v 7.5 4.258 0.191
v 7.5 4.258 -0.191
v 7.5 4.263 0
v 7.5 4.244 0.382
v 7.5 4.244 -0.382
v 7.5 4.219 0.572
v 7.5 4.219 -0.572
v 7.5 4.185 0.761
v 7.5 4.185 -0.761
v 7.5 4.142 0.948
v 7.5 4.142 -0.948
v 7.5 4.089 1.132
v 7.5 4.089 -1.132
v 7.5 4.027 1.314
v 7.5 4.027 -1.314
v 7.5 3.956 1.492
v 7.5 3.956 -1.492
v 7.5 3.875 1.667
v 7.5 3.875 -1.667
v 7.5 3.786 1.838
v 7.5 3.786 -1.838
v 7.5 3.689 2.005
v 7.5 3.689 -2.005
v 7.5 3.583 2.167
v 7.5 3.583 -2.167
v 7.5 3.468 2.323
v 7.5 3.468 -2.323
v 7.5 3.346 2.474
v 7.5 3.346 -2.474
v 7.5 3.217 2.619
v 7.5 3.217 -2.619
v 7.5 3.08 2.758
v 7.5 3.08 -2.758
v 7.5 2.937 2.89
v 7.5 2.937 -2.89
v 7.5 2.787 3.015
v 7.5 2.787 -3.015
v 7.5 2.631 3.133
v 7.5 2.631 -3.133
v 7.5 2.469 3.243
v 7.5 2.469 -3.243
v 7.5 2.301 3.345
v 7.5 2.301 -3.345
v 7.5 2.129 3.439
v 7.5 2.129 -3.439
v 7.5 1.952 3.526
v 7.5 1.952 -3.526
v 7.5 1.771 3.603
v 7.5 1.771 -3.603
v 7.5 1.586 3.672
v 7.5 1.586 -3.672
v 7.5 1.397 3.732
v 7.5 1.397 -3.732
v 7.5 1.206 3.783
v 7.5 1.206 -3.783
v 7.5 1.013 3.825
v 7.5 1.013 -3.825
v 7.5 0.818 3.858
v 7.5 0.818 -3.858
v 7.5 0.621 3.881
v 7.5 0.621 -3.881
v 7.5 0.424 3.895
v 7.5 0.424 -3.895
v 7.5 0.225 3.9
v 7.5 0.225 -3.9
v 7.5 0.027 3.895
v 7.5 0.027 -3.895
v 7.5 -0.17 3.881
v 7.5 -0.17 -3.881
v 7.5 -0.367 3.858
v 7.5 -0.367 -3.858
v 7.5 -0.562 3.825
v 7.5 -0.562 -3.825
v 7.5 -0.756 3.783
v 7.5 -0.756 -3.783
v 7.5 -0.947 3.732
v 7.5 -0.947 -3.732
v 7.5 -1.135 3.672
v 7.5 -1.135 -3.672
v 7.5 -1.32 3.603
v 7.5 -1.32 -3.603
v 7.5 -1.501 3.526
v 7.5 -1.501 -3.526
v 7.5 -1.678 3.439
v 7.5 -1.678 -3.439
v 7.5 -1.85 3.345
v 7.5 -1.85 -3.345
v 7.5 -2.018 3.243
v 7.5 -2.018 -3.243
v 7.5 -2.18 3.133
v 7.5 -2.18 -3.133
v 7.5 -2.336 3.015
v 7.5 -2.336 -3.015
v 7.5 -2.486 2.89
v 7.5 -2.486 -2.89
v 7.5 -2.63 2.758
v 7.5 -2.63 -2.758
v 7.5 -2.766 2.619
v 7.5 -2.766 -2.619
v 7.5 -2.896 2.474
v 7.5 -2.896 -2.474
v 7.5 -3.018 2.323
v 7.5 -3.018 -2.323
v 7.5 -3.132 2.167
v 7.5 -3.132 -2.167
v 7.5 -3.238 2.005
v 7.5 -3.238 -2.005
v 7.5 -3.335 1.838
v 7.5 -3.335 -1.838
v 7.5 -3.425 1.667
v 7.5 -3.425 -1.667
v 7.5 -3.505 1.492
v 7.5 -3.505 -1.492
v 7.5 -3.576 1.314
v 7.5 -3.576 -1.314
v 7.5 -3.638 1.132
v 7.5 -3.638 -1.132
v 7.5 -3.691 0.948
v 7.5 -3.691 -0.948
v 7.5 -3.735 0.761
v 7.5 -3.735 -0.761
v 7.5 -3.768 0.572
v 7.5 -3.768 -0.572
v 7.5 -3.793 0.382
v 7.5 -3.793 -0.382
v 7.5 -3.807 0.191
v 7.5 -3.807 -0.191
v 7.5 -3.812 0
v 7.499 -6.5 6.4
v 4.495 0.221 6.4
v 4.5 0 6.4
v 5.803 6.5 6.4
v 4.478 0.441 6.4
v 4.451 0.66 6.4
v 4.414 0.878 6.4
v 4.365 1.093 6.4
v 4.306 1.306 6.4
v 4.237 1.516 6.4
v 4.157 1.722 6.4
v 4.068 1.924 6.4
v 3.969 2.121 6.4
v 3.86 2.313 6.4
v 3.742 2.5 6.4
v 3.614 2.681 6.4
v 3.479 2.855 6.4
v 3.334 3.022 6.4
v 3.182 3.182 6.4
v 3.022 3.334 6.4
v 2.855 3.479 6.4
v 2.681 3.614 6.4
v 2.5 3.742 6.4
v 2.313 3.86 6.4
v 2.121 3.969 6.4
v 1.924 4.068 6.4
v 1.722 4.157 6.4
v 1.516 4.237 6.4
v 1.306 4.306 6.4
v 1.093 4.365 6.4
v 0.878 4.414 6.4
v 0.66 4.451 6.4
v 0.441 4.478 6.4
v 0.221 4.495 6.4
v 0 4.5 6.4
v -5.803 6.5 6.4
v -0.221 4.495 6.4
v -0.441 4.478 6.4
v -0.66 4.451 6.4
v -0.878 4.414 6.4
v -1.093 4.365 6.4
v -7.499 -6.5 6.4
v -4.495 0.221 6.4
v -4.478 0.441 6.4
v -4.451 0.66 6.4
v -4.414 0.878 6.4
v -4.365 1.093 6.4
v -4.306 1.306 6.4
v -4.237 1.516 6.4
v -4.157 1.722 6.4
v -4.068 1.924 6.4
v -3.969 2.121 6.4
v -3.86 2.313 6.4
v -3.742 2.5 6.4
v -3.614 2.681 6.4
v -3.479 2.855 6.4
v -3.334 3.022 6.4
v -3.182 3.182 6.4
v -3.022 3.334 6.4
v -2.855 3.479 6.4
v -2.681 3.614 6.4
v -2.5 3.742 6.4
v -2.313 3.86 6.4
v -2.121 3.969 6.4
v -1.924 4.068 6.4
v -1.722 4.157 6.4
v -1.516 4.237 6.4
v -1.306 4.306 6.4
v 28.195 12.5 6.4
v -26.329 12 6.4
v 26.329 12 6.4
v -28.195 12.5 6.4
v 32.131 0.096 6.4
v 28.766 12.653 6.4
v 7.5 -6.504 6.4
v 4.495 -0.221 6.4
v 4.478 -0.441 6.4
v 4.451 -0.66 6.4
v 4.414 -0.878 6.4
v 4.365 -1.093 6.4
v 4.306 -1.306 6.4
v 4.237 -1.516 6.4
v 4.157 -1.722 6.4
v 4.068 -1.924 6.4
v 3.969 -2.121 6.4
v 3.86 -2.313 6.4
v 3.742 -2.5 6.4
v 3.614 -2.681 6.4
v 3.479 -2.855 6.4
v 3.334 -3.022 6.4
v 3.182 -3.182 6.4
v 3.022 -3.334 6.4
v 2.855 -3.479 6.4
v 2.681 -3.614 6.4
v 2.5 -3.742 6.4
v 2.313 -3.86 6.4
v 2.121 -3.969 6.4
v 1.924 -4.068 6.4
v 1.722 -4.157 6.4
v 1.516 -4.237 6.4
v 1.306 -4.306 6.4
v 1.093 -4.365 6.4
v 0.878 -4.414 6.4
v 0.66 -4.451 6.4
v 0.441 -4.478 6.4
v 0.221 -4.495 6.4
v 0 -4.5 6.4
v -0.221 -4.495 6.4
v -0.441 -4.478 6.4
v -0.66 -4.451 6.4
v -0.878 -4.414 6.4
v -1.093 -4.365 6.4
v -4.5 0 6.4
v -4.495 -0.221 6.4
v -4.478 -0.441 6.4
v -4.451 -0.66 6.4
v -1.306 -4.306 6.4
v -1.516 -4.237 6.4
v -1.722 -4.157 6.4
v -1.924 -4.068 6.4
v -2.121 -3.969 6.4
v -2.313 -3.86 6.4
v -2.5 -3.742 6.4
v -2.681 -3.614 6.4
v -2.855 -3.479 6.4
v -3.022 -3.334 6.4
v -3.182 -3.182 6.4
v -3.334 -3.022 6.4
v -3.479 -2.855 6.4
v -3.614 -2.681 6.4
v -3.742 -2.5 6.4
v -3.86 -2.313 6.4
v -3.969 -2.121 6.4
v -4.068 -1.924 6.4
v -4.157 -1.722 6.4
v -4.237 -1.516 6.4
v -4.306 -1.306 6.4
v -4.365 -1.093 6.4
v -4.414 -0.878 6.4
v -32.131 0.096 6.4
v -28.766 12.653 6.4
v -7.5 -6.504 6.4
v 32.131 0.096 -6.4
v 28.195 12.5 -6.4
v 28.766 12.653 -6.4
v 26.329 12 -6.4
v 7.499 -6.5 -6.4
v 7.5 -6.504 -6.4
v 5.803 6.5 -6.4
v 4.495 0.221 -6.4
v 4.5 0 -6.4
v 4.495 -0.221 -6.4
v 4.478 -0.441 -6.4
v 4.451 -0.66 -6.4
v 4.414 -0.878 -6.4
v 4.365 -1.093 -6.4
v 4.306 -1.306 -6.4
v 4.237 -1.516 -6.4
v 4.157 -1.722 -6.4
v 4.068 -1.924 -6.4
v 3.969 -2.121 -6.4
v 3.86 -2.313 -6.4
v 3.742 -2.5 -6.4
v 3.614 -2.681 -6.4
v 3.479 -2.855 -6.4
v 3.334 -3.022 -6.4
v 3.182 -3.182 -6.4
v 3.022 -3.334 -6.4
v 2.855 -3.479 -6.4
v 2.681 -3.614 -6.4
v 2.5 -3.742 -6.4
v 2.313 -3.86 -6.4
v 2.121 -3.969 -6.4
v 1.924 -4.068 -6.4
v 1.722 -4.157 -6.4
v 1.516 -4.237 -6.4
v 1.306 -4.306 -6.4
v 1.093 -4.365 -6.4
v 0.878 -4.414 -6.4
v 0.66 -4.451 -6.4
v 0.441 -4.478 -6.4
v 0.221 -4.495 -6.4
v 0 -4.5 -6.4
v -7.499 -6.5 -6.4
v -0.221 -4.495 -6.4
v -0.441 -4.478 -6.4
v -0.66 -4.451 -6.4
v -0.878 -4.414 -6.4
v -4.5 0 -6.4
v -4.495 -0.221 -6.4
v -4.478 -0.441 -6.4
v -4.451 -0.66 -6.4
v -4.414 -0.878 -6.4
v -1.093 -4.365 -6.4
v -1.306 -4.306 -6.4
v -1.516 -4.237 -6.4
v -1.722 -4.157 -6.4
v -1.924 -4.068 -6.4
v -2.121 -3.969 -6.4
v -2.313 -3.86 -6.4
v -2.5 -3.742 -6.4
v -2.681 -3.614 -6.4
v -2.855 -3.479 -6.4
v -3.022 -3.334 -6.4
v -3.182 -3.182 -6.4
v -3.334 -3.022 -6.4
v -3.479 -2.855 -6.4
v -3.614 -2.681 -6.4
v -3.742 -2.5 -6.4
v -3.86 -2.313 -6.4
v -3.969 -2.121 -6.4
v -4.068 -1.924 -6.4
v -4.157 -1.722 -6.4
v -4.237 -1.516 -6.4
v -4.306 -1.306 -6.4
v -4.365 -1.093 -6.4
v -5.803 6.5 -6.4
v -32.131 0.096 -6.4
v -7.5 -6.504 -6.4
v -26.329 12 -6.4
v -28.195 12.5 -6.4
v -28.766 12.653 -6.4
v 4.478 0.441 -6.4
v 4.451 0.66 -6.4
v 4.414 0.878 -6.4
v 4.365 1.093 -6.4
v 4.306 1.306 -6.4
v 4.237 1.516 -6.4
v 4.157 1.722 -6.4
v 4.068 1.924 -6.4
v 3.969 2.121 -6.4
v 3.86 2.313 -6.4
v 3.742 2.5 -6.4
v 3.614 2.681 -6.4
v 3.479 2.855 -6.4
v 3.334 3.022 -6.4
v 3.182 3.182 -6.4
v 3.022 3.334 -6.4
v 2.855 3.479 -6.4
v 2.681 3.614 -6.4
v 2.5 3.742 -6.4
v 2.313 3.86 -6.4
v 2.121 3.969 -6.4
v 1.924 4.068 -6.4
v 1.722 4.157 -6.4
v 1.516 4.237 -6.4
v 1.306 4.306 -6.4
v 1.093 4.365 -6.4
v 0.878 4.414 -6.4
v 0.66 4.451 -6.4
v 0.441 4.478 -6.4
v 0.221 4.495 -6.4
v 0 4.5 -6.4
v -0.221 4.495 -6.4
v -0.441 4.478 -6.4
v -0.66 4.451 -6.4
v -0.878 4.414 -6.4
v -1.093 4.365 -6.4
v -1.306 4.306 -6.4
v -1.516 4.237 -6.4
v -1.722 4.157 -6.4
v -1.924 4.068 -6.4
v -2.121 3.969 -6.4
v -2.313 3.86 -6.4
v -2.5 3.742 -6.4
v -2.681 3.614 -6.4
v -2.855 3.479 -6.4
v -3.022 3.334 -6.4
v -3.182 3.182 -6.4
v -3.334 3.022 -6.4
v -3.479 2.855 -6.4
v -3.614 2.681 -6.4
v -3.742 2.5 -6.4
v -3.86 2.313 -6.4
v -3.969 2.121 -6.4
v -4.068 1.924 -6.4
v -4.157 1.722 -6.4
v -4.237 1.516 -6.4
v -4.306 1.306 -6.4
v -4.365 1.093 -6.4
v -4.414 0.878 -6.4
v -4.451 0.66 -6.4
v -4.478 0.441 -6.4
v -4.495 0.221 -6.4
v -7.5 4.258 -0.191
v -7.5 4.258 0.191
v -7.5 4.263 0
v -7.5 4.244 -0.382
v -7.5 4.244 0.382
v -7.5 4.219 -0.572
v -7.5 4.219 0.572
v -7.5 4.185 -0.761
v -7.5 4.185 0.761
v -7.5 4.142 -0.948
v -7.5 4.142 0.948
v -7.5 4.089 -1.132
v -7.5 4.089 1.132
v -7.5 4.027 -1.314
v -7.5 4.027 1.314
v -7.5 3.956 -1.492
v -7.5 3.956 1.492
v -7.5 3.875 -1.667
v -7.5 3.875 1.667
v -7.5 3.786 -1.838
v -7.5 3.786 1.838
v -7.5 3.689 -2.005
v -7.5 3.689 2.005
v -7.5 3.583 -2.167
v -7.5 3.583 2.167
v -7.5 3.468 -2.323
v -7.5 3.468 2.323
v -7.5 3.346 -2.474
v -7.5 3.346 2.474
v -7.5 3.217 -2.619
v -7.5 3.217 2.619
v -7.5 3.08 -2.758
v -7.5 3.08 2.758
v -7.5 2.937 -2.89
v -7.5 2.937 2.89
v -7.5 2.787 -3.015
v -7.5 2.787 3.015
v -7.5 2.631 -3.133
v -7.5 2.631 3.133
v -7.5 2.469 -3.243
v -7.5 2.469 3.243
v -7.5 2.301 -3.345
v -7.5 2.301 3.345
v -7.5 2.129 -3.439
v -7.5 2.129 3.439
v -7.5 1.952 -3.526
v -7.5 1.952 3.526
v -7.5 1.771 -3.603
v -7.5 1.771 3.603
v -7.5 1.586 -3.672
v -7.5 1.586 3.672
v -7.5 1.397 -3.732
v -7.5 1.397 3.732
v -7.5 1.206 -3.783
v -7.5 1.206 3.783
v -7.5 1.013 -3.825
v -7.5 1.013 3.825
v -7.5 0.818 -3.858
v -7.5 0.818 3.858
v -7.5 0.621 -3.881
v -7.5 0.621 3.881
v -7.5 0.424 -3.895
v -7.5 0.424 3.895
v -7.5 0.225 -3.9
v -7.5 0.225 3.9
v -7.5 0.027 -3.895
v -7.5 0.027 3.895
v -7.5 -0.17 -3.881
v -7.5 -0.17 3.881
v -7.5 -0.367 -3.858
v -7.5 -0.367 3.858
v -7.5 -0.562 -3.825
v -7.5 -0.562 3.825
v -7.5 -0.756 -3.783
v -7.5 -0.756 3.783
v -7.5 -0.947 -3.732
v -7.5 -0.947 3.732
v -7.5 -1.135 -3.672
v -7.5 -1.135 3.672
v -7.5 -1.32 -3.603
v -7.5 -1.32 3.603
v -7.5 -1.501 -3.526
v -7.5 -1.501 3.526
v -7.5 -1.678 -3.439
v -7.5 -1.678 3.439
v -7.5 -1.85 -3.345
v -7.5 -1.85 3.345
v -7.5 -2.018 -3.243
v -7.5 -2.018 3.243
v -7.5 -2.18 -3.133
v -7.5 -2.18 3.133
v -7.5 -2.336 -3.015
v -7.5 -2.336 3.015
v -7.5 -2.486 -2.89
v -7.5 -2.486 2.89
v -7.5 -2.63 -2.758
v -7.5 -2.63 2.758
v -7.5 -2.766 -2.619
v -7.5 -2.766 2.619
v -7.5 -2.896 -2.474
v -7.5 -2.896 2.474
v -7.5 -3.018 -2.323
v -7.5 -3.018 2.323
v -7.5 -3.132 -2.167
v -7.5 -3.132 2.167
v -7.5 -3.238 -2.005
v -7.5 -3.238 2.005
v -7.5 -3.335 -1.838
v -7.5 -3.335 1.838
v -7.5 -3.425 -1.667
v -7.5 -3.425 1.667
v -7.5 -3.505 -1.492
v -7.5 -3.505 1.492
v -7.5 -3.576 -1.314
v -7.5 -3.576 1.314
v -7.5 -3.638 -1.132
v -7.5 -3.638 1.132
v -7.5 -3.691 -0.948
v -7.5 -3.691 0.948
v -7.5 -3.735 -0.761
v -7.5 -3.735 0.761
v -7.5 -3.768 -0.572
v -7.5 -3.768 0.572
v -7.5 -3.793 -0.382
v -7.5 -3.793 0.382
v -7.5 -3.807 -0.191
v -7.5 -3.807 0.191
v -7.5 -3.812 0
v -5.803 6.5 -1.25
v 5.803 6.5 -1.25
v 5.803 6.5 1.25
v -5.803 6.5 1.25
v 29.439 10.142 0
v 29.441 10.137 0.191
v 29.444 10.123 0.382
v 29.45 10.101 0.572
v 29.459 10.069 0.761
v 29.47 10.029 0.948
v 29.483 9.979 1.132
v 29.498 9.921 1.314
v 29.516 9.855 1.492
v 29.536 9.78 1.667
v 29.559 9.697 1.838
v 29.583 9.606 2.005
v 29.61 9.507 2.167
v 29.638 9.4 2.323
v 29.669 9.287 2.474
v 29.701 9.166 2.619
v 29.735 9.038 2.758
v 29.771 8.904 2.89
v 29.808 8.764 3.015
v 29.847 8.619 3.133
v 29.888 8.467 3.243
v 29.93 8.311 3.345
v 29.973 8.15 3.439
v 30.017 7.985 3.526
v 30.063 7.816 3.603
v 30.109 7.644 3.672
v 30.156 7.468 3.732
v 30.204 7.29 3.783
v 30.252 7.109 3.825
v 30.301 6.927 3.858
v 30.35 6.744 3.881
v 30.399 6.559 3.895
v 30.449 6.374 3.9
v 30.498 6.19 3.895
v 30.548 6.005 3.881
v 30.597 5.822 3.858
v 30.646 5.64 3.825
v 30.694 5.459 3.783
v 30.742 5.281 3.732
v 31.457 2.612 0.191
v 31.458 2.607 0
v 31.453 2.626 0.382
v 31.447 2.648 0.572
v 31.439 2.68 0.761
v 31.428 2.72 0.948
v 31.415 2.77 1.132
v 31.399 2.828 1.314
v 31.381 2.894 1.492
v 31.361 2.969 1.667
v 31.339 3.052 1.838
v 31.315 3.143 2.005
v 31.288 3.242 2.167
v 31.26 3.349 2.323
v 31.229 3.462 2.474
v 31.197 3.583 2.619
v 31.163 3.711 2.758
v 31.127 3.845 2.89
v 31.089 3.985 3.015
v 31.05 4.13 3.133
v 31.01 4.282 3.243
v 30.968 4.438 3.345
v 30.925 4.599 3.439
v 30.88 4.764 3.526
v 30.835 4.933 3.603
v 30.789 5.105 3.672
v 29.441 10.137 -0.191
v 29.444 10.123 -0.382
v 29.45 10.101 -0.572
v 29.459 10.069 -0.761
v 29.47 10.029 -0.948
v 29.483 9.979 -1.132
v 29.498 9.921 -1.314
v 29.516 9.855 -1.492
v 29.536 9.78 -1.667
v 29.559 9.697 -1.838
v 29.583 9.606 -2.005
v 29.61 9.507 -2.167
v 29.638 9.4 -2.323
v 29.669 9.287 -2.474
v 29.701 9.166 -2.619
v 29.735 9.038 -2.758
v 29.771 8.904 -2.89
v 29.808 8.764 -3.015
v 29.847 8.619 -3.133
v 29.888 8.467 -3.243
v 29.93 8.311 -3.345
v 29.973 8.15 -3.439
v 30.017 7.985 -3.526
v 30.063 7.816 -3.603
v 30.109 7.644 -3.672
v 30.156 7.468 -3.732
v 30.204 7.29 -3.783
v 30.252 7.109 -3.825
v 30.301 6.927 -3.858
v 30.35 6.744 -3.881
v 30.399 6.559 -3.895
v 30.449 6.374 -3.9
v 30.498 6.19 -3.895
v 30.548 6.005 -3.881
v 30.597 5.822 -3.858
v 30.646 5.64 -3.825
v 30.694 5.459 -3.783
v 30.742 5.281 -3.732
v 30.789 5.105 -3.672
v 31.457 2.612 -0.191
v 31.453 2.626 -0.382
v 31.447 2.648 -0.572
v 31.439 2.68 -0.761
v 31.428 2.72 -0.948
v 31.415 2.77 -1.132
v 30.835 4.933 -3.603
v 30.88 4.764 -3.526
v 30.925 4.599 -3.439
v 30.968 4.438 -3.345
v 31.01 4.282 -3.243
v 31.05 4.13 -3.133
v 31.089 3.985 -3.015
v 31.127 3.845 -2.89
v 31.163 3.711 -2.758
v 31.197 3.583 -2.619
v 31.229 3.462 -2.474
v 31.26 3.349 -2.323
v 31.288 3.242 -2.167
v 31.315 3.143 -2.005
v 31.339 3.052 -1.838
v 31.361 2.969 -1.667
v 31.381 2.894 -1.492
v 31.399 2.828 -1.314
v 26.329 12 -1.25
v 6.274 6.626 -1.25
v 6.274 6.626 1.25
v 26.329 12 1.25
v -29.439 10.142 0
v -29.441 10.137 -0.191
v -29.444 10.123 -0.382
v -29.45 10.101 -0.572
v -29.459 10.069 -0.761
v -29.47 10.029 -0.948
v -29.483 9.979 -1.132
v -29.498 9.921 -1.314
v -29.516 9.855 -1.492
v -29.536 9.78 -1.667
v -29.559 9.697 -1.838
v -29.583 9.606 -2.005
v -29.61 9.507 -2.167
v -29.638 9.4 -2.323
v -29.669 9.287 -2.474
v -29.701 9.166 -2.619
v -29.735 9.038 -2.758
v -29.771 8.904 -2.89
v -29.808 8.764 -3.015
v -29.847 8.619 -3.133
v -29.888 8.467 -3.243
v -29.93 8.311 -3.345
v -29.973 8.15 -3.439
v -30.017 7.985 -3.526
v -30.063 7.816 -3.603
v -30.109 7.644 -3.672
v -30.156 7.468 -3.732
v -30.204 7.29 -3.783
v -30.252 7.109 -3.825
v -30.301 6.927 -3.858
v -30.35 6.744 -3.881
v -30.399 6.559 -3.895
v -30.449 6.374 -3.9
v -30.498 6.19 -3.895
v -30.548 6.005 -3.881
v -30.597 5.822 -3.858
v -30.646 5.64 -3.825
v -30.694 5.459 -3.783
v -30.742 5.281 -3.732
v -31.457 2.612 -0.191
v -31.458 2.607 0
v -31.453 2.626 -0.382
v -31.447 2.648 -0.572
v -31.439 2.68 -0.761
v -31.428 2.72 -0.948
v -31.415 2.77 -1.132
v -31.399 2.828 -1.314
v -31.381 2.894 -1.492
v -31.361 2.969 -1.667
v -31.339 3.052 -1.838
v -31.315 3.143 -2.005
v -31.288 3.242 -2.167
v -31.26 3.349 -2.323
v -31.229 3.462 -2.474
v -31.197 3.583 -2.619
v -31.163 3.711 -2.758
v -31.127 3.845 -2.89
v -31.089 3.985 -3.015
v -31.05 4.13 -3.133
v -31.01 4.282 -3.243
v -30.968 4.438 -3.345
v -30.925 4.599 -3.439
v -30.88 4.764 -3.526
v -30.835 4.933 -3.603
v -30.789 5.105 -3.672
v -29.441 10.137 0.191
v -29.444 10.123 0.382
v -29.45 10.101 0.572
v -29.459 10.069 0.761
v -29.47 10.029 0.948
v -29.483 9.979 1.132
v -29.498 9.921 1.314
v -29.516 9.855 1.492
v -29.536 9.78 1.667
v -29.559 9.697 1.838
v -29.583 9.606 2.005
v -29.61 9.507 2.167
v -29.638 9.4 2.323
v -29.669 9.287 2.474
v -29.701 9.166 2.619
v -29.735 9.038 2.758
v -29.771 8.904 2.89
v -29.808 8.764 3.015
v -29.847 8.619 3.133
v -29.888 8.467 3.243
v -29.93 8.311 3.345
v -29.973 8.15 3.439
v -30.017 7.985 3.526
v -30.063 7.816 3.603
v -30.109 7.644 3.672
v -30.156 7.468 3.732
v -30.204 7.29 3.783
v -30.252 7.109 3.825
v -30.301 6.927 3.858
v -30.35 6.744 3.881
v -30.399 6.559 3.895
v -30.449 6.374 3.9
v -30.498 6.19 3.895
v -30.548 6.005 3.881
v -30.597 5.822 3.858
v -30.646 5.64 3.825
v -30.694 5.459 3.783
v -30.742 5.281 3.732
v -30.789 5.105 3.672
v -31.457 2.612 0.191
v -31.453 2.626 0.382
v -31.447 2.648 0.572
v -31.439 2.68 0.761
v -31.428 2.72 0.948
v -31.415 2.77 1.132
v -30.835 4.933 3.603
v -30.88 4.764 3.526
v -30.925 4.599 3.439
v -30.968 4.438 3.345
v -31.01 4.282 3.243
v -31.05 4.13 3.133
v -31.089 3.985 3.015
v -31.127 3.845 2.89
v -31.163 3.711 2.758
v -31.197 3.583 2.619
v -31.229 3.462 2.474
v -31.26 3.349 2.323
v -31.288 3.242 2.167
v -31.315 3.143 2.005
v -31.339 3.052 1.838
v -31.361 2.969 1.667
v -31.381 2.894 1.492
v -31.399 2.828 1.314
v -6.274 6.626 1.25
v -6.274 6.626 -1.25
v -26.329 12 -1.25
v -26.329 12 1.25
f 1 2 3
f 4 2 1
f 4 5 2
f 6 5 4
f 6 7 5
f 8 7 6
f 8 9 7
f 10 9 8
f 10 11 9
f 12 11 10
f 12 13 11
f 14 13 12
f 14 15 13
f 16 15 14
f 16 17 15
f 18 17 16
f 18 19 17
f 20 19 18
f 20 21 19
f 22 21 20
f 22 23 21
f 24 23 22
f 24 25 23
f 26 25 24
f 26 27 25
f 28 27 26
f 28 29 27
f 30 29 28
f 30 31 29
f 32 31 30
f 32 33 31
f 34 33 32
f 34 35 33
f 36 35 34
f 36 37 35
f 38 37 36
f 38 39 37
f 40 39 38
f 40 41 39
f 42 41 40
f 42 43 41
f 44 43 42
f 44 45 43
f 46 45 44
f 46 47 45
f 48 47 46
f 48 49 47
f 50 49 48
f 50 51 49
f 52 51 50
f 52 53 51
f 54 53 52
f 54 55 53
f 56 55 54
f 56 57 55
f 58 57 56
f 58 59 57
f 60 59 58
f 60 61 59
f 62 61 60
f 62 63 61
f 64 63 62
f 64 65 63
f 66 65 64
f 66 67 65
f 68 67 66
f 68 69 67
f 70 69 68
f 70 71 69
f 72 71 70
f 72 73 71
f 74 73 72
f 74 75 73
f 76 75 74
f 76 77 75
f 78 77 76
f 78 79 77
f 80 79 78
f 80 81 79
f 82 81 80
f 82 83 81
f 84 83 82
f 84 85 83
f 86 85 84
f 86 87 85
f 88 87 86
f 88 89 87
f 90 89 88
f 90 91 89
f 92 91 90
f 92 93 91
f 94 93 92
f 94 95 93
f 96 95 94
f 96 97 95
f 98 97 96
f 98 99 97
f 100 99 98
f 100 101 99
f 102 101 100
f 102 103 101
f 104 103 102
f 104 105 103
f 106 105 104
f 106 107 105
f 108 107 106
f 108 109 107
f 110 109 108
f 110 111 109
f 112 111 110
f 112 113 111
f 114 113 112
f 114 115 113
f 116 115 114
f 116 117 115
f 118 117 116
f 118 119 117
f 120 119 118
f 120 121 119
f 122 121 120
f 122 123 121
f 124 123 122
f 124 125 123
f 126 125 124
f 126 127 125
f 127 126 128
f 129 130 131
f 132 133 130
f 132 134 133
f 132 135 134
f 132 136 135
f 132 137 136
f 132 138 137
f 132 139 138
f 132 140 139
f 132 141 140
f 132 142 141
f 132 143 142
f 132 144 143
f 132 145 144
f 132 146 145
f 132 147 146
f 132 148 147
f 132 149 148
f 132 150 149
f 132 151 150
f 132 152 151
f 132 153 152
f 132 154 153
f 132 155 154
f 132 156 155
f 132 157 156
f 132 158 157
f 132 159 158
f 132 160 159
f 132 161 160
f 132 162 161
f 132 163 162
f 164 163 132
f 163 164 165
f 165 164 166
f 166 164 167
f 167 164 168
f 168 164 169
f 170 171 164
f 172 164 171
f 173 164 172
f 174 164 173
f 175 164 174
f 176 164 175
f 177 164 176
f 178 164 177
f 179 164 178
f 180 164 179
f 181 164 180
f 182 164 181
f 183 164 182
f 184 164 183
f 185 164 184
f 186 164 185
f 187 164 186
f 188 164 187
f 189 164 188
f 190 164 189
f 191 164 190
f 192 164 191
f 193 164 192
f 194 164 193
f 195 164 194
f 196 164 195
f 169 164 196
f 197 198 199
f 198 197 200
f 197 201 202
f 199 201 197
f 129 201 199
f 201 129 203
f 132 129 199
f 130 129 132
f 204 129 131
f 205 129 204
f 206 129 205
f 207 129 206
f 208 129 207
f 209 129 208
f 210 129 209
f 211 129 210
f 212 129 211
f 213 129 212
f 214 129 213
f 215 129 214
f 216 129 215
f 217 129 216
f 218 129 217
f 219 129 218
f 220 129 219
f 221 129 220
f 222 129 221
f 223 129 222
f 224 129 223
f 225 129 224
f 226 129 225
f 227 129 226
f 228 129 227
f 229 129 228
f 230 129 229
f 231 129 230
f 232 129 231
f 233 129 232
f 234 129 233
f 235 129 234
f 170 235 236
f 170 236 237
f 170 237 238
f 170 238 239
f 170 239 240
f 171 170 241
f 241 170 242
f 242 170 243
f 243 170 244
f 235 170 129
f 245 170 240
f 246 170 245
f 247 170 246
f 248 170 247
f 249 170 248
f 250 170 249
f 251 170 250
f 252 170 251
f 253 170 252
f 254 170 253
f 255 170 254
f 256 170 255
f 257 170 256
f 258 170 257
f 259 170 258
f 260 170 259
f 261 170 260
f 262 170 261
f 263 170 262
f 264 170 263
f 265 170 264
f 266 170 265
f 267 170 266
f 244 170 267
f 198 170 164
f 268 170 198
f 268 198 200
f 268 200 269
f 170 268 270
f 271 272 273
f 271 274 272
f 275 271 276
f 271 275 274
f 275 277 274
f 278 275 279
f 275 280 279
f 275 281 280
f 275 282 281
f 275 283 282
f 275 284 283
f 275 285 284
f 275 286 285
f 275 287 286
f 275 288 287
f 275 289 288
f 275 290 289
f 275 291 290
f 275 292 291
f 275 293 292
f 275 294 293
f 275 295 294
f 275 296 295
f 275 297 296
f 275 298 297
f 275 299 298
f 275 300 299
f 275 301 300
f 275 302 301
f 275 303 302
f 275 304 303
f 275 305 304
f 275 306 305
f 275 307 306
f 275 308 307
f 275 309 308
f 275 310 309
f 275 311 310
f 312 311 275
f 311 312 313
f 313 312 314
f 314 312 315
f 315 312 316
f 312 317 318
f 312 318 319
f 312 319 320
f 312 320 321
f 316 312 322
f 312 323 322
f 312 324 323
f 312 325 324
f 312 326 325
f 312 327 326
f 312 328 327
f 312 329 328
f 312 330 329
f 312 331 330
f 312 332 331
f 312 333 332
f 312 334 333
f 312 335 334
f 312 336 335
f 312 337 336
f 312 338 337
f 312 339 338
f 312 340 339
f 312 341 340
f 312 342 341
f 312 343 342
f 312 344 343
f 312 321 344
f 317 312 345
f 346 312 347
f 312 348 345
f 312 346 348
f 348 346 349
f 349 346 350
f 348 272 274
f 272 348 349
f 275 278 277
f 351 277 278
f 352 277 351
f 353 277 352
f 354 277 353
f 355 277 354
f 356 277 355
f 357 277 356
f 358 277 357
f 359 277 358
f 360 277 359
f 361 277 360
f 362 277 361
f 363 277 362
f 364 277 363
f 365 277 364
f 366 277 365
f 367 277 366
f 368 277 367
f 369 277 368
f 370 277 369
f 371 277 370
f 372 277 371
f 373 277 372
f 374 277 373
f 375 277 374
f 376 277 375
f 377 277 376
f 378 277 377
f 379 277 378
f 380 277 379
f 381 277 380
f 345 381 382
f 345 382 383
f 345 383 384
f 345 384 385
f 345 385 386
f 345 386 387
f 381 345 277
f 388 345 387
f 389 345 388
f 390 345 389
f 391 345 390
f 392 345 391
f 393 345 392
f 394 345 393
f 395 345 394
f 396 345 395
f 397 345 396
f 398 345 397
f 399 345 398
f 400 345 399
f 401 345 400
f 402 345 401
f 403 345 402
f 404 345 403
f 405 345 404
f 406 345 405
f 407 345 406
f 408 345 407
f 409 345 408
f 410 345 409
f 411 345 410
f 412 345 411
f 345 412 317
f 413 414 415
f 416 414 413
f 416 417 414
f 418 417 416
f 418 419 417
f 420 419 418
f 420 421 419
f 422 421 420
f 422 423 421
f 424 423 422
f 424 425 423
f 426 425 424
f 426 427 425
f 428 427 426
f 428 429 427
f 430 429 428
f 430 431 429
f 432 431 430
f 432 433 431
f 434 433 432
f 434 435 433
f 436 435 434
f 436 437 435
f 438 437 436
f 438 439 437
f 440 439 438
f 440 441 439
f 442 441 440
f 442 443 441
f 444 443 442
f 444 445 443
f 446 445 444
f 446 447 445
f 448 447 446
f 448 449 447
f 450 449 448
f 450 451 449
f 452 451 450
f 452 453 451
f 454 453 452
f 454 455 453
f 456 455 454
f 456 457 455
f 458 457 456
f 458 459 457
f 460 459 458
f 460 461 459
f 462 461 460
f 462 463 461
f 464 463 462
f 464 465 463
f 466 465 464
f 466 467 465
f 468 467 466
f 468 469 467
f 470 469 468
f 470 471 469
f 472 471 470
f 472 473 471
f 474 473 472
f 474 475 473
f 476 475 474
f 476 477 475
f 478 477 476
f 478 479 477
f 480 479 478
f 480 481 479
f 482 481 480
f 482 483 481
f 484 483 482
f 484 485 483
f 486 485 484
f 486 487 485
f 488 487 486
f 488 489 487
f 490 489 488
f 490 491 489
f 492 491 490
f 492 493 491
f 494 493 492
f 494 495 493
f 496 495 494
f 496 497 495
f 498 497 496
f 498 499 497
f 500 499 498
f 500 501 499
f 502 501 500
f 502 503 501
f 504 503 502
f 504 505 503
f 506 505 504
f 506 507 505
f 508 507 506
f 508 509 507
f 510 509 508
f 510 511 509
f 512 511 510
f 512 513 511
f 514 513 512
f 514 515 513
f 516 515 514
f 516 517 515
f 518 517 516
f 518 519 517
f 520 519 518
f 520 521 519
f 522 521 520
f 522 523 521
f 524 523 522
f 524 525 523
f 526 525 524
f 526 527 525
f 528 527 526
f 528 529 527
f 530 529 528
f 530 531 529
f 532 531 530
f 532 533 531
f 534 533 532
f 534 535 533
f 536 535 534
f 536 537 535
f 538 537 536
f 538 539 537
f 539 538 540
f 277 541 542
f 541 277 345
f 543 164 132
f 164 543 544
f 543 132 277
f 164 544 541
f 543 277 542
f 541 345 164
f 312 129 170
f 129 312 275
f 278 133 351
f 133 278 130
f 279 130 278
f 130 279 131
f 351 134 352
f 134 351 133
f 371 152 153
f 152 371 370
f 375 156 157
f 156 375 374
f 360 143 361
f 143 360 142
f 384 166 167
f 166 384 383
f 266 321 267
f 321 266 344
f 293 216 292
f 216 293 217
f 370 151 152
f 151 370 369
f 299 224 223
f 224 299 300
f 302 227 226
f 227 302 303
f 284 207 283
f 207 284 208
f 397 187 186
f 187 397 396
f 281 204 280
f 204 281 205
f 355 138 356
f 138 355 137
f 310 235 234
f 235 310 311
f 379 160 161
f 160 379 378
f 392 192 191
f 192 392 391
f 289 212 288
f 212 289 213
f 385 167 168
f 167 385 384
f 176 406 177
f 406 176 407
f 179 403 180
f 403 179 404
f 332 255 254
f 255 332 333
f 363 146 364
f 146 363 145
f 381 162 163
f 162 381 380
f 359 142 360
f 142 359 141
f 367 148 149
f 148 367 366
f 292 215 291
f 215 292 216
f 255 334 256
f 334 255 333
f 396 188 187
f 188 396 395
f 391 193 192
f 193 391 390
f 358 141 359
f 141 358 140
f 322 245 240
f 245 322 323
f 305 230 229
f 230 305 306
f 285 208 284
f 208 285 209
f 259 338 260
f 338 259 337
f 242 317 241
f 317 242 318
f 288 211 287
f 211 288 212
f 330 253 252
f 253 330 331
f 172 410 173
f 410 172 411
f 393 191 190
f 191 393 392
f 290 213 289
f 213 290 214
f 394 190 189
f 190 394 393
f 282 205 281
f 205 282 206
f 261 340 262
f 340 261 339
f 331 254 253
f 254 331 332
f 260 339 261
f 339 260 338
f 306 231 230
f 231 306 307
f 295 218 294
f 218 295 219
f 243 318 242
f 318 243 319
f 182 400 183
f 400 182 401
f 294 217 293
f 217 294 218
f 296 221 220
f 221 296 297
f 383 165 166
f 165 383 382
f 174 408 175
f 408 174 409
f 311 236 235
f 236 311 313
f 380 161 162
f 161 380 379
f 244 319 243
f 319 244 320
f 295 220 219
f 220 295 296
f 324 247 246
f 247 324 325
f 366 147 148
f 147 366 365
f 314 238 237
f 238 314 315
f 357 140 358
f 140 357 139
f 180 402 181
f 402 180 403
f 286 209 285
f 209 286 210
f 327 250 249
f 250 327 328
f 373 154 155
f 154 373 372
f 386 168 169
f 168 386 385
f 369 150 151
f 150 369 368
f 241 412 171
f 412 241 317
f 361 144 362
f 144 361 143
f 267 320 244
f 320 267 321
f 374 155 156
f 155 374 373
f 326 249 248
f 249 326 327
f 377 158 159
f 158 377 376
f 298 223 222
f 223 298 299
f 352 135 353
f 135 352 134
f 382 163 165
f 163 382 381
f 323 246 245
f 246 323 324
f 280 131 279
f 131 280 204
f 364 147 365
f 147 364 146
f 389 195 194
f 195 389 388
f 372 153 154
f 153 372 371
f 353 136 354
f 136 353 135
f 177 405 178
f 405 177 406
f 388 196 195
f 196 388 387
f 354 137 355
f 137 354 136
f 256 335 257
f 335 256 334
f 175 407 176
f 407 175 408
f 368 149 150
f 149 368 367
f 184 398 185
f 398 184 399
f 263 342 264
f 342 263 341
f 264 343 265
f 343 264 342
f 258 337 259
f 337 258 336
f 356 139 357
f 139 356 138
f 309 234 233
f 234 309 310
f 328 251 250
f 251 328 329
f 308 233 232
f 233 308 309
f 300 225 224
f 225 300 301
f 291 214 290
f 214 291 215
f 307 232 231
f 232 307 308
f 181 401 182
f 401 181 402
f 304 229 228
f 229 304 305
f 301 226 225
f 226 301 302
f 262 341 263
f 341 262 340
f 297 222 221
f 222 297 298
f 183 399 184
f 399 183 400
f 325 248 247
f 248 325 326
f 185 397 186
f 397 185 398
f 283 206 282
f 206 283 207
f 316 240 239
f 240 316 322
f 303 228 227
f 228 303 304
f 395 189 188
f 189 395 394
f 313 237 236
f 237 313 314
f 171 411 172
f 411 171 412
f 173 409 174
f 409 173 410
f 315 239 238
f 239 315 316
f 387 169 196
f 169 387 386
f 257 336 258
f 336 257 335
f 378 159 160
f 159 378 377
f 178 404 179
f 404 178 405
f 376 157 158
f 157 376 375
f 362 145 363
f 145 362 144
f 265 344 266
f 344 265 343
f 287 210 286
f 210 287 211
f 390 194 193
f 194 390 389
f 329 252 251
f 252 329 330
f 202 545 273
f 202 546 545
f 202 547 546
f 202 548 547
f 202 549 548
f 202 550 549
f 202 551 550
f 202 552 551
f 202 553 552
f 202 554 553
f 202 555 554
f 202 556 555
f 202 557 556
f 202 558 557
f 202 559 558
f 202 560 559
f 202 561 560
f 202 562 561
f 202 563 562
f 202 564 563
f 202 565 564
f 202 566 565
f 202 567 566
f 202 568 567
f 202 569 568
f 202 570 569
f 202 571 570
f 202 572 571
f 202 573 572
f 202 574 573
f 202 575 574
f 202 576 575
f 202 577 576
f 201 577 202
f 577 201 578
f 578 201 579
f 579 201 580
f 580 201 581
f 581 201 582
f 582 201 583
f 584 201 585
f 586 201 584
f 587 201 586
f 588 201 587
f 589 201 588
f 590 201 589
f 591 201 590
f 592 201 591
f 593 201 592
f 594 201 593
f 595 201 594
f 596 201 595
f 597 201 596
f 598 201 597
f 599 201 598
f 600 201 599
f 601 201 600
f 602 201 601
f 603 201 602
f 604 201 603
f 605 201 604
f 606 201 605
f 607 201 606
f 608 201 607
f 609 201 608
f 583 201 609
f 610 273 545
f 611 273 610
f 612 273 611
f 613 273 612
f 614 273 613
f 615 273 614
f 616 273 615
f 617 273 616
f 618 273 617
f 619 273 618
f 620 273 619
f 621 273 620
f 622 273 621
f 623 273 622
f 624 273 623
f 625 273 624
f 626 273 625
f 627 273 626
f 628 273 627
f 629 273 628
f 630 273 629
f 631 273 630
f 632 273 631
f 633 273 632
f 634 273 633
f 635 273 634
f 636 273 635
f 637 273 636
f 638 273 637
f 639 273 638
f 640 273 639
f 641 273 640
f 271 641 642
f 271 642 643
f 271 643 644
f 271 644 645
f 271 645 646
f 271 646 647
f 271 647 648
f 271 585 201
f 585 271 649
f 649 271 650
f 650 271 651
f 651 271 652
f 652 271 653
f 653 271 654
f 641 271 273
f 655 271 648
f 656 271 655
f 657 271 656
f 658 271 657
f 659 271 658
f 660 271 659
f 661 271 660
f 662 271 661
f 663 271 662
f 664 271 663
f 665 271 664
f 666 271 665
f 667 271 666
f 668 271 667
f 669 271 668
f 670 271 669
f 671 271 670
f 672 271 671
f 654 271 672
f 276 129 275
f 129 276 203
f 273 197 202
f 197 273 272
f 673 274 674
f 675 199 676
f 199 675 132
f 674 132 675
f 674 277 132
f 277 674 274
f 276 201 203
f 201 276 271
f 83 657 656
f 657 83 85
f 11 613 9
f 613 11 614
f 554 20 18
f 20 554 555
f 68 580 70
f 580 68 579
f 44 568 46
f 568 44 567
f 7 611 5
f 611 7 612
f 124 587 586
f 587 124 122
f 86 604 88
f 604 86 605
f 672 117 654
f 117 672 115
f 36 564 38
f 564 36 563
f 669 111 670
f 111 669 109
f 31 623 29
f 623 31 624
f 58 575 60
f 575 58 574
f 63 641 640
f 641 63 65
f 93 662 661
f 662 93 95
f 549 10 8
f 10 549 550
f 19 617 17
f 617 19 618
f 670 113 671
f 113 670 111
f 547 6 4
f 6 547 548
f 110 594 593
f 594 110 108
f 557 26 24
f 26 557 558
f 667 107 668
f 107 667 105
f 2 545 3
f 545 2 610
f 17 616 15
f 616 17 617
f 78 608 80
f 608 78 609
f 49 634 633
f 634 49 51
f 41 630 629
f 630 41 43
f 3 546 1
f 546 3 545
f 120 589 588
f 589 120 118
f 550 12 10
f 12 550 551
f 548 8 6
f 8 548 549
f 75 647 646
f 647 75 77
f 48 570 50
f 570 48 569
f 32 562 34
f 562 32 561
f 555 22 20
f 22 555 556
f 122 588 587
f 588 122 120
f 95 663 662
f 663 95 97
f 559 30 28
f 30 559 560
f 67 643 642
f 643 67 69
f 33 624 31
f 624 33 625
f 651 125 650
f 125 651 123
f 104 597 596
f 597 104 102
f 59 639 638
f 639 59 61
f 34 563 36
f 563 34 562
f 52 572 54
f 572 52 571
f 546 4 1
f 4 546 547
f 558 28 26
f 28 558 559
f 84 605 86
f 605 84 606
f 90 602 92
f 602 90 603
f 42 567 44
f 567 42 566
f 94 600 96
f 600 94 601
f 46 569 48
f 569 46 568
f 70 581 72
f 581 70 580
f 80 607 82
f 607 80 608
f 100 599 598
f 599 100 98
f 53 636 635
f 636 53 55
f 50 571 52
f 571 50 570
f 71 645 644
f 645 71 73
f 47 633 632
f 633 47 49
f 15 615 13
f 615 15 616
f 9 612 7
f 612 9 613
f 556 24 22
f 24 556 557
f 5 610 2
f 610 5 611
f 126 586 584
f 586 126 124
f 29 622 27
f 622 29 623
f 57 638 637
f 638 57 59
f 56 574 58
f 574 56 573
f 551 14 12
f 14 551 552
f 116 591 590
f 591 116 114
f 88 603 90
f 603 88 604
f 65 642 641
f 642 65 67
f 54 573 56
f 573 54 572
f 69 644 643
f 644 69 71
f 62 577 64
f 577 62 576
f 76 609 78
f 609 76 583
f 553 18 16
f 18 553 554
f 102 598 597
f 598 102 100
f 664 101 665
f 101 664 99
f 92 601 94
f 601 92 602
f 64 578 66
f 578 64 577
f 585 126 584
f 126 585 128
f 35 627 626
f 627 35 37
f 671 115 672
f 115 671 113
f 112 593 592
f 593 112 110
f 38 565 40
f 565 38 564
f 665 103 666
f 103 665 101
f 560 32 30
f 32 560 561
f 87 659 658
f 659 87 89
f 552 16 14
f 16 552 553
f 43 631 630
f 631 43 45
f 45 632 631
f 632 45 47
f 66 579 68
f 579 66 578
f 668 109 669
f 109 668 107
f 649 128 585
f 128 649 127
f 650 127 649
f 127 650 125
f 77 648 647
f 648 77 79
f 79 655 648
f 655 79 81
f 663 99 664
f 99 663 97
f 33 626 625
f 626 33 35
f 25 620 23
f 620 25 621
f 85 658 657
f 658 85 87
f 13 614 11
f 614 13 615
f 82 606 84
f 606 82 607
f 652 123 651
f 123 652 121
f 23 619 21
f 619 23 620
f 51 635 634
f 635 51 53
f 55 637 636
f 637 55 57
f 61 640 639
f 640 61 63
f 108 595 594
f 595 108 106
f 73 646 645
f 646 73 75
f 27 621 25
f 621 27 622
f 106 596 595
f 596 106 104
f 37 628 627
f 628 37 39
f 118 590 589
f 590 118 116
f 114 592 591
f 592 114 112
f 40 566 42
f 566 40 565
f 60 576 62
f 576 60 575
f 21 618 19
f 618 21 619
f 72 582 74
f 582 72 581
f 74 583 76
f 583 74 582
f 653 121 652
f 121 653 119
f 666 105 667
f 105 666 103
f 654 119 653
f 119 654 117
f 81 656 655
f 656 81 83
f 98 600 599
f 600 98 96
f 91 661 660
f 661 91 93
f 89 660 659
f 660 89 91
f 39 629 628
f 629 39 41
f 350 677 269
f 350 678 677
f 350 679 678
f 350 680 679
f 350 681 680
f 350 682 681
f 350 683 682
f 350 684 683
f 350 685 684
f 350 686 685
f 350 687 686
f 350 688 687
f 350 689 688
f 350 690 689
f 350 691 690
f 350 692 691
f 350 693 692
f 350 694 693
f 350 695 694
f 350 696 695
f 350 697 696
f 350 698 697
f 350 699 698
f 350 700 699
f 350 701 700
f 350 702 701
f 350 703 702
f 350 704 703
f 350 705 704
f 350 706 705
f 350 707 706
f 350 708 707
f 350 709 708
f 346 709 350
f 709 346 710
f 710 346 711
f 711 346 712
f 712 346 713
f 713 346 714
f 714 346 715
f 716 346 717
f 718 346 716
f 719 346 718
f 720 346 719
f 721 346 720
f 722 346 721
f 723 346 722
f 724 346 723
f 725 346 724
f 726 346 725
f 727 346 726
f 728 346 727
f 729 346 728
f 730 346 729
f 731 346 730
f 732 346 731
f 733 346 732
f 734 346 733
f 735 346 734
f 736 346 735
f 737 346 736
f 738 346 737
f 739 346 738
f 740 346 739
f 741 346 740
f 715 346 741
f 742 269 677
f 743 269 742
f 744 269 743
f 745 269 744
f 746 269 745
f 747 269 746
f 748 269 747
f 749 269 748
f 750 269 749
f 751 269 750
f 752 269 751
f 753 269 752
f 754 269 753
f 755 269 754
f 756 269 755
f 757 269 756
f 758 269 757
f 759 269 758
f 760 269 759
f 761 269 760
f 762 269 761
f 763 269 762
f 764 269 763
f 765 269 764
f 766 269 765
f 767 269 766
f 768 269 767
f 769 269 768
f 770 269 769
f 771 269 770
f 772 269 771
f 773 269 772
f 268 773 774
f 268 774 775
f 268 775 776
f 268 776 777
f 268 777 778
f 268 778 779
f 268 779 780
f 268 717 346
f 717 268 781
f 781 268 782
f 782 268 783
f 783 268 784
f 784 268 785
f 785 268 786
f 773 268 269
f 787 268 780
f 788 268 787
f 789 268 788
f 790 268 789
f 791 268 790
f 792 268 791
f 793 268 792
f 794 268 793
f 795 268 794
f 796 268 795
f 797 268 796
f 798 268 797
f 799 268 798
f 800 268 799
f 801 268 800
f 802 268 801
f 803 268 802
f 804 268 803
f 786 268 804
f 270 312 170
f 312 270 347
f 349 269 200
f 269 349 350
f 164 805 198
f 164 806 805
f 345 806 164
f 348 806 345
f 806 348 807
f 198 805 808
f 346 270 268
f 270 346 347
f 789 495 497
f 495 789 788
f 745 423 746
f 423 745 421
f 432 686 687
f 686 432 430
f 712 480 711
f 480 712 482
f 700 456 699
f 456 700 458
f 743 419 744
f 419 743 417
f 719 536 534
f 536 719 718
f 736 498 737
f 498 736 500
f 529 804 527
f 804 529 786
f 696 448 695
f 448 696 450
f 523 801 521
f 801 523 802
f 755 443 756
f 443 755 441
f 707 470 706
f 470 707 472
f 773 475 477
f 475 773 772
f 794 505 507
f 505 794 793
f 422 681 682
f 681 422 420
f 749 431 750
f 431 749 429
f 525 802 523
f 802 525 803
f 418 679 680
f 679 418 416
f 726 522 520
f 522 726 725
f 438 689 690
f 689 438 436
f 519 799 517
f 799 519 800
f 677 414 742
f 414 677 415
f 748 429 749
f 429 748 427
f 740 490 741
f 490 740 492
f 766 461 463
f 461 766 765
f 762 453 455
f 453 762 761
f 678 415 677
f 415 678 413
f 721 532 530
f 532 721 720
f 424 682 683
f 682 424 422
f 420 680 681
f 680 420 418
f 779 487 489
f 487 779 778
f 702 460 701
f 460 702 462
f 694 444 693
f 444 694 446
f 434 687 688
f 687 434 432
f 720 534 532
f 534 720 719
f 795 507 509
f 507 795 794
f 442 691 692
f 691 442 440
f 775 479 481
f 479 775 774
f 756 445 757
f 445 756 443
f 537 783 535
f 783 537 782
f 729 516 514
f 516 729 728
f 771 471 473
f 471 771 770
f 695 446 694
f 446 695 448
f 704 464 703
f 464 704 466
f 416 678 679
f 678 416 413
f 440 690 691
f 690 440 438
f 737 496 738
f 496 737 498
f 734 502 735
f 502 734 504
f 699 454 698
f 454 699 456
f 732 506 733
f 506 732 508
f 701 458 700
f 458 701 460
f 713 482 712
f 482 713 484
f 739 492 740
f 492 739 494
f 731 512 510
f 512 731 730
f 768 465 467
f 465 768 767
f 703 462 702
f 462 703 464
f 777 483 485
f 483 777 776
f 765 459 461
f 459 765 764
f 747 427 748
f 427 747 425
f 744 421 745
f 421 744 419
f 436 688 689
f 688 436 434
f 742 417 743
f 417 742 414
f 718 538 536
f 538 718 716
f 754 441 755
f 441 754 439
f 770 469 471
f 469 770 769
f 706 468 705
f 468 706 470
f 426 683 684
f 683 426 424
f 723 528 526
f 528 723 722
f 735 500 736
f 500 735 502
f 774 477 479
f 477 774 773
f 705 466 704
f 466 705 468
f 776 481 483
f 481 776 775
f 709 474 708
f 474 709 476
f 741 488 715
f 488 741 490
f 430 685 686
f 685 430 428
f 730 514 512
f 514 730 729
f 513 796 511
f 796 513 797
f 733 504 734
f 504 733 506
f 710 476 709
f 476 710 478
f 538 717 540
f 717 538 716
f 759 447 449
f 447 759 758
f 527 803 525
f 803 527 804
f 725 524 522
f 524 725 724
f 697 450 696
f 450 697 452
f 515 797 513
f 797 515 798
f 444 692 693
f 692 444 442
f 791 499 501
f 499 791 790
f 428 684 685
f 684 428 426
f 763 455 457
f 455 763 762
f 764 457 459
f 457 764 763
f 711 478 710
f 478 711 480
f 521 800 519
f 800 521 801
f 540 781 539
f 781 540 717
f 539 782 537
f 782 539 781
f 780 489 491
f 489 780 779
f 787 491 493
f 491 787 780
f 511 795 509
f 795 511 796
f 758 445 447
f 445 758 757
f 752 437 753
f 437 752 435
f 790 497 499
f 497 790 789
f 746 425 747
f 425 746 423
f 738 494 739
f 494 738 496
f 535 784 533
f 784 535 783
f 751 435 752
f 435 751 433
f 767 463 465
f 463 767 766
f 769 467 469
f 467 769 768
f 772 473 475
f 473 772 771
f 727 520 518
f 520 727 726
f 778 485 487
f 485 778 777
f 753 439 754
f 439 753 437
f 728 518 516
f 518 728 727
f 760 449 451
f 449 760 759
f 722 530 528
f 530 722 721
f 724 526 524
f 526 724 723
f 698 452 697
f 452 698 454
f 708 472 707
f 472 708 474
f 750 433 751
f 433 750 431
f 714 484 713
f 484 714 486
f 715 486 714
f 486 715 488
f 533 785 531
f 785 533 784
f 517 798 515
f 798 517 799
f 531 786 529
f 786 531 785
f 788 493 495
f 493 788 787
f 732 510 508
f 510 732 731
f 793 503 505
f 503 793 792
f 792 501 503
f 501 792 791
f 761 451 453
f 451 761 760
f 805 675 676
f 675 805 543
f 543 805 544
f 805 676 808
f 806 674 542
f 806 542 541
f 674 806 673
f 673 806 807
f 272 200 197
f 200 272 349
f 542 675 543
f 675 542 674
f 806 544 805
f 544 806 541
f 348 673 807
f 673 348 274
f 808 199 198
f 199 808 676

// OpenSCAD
// Diameter of the hole for the kite's spine
spine_hole_diameter = 9;
// Length of the "horizontal" section through which the spine goes
spine_length = 15;
// Diameter of the holes in the "arms"
arm_hole_diameter = 8.8;
// Minimum wall thickness (hole to outer edge)
wall_thickness = 2;
// Length of the "arms"
arm_length = 25.5;
// Depth of webbing between the arms (measured outwards from the "horizontal" section)
webbing_depth = 6;
// Thickness of the webbing
webbing_thickness = 2.5;

height = arm_hole_diameter + (wall_thickness * 2);
depth = max(arm_hole_diameter, spine_hole_diameter) + (wall_thickness * 2);
arm_offset_w = (((arm_length * sin(75)) - (depth * sin(15))) + spine_length) / 2;
arm_depth_extra = (((depth * sin(15)) / sin(75)) * sin(15)) / 2;
arm_offset_d = ((arm_length * sin(15)) - arm_depth_extra) / 2;
webbing_offset = (webbing_depth + depth) / 2;
webbing_flat_offset = webbing_offset + (webbing_depth / 2) - 0.25;
webbing_inseam = (arm_length * sin(75)) - (depth * sin(15));
webbing_length = webbing_inseam * 2 + spine_length;

echo(webbing_length);

// middle section
difference() {
	cube([spine_length, depth, height], center=true);
	cylinder(d=spine_hole_diameter, h=height, $fn=128, center=true);
}

// arms - 15deg angle
translate([arm_offset_w, arm_offset_d, 0]) rotate([0, 0, 15]) arm();
translate([-arm_offset_w, arm_offset_d, 0]) rotate([0, 180, -15]) arm();

// webbing
difference() {
	translate([0, webbing_offset, 0]) cube([webbing_length, webbing_depth, webbing_thickness], center=true);
	translate([arm_offset_w, arm_offset_d, 0]) rotate([0, 0, 15]) cube([arm_length, depth, 10], center=true);
	translate([-arm_offset_w, arm_offset_d, 0]) rotate([0, 180, -15]) cube([arm_length, depth, 10], center=true);
}
translate([0, webbing_flat_offset, 0]) cube([webbing_length, 0.5, height], center=true);

module arm() {
	difference() {
		cube([arm_length, depth, height], center=true);
		rotate([90, 0, 90]) cylinder(d=7.8, h=arm_length + 0.1, $fn=128, center=true);
	}
}
